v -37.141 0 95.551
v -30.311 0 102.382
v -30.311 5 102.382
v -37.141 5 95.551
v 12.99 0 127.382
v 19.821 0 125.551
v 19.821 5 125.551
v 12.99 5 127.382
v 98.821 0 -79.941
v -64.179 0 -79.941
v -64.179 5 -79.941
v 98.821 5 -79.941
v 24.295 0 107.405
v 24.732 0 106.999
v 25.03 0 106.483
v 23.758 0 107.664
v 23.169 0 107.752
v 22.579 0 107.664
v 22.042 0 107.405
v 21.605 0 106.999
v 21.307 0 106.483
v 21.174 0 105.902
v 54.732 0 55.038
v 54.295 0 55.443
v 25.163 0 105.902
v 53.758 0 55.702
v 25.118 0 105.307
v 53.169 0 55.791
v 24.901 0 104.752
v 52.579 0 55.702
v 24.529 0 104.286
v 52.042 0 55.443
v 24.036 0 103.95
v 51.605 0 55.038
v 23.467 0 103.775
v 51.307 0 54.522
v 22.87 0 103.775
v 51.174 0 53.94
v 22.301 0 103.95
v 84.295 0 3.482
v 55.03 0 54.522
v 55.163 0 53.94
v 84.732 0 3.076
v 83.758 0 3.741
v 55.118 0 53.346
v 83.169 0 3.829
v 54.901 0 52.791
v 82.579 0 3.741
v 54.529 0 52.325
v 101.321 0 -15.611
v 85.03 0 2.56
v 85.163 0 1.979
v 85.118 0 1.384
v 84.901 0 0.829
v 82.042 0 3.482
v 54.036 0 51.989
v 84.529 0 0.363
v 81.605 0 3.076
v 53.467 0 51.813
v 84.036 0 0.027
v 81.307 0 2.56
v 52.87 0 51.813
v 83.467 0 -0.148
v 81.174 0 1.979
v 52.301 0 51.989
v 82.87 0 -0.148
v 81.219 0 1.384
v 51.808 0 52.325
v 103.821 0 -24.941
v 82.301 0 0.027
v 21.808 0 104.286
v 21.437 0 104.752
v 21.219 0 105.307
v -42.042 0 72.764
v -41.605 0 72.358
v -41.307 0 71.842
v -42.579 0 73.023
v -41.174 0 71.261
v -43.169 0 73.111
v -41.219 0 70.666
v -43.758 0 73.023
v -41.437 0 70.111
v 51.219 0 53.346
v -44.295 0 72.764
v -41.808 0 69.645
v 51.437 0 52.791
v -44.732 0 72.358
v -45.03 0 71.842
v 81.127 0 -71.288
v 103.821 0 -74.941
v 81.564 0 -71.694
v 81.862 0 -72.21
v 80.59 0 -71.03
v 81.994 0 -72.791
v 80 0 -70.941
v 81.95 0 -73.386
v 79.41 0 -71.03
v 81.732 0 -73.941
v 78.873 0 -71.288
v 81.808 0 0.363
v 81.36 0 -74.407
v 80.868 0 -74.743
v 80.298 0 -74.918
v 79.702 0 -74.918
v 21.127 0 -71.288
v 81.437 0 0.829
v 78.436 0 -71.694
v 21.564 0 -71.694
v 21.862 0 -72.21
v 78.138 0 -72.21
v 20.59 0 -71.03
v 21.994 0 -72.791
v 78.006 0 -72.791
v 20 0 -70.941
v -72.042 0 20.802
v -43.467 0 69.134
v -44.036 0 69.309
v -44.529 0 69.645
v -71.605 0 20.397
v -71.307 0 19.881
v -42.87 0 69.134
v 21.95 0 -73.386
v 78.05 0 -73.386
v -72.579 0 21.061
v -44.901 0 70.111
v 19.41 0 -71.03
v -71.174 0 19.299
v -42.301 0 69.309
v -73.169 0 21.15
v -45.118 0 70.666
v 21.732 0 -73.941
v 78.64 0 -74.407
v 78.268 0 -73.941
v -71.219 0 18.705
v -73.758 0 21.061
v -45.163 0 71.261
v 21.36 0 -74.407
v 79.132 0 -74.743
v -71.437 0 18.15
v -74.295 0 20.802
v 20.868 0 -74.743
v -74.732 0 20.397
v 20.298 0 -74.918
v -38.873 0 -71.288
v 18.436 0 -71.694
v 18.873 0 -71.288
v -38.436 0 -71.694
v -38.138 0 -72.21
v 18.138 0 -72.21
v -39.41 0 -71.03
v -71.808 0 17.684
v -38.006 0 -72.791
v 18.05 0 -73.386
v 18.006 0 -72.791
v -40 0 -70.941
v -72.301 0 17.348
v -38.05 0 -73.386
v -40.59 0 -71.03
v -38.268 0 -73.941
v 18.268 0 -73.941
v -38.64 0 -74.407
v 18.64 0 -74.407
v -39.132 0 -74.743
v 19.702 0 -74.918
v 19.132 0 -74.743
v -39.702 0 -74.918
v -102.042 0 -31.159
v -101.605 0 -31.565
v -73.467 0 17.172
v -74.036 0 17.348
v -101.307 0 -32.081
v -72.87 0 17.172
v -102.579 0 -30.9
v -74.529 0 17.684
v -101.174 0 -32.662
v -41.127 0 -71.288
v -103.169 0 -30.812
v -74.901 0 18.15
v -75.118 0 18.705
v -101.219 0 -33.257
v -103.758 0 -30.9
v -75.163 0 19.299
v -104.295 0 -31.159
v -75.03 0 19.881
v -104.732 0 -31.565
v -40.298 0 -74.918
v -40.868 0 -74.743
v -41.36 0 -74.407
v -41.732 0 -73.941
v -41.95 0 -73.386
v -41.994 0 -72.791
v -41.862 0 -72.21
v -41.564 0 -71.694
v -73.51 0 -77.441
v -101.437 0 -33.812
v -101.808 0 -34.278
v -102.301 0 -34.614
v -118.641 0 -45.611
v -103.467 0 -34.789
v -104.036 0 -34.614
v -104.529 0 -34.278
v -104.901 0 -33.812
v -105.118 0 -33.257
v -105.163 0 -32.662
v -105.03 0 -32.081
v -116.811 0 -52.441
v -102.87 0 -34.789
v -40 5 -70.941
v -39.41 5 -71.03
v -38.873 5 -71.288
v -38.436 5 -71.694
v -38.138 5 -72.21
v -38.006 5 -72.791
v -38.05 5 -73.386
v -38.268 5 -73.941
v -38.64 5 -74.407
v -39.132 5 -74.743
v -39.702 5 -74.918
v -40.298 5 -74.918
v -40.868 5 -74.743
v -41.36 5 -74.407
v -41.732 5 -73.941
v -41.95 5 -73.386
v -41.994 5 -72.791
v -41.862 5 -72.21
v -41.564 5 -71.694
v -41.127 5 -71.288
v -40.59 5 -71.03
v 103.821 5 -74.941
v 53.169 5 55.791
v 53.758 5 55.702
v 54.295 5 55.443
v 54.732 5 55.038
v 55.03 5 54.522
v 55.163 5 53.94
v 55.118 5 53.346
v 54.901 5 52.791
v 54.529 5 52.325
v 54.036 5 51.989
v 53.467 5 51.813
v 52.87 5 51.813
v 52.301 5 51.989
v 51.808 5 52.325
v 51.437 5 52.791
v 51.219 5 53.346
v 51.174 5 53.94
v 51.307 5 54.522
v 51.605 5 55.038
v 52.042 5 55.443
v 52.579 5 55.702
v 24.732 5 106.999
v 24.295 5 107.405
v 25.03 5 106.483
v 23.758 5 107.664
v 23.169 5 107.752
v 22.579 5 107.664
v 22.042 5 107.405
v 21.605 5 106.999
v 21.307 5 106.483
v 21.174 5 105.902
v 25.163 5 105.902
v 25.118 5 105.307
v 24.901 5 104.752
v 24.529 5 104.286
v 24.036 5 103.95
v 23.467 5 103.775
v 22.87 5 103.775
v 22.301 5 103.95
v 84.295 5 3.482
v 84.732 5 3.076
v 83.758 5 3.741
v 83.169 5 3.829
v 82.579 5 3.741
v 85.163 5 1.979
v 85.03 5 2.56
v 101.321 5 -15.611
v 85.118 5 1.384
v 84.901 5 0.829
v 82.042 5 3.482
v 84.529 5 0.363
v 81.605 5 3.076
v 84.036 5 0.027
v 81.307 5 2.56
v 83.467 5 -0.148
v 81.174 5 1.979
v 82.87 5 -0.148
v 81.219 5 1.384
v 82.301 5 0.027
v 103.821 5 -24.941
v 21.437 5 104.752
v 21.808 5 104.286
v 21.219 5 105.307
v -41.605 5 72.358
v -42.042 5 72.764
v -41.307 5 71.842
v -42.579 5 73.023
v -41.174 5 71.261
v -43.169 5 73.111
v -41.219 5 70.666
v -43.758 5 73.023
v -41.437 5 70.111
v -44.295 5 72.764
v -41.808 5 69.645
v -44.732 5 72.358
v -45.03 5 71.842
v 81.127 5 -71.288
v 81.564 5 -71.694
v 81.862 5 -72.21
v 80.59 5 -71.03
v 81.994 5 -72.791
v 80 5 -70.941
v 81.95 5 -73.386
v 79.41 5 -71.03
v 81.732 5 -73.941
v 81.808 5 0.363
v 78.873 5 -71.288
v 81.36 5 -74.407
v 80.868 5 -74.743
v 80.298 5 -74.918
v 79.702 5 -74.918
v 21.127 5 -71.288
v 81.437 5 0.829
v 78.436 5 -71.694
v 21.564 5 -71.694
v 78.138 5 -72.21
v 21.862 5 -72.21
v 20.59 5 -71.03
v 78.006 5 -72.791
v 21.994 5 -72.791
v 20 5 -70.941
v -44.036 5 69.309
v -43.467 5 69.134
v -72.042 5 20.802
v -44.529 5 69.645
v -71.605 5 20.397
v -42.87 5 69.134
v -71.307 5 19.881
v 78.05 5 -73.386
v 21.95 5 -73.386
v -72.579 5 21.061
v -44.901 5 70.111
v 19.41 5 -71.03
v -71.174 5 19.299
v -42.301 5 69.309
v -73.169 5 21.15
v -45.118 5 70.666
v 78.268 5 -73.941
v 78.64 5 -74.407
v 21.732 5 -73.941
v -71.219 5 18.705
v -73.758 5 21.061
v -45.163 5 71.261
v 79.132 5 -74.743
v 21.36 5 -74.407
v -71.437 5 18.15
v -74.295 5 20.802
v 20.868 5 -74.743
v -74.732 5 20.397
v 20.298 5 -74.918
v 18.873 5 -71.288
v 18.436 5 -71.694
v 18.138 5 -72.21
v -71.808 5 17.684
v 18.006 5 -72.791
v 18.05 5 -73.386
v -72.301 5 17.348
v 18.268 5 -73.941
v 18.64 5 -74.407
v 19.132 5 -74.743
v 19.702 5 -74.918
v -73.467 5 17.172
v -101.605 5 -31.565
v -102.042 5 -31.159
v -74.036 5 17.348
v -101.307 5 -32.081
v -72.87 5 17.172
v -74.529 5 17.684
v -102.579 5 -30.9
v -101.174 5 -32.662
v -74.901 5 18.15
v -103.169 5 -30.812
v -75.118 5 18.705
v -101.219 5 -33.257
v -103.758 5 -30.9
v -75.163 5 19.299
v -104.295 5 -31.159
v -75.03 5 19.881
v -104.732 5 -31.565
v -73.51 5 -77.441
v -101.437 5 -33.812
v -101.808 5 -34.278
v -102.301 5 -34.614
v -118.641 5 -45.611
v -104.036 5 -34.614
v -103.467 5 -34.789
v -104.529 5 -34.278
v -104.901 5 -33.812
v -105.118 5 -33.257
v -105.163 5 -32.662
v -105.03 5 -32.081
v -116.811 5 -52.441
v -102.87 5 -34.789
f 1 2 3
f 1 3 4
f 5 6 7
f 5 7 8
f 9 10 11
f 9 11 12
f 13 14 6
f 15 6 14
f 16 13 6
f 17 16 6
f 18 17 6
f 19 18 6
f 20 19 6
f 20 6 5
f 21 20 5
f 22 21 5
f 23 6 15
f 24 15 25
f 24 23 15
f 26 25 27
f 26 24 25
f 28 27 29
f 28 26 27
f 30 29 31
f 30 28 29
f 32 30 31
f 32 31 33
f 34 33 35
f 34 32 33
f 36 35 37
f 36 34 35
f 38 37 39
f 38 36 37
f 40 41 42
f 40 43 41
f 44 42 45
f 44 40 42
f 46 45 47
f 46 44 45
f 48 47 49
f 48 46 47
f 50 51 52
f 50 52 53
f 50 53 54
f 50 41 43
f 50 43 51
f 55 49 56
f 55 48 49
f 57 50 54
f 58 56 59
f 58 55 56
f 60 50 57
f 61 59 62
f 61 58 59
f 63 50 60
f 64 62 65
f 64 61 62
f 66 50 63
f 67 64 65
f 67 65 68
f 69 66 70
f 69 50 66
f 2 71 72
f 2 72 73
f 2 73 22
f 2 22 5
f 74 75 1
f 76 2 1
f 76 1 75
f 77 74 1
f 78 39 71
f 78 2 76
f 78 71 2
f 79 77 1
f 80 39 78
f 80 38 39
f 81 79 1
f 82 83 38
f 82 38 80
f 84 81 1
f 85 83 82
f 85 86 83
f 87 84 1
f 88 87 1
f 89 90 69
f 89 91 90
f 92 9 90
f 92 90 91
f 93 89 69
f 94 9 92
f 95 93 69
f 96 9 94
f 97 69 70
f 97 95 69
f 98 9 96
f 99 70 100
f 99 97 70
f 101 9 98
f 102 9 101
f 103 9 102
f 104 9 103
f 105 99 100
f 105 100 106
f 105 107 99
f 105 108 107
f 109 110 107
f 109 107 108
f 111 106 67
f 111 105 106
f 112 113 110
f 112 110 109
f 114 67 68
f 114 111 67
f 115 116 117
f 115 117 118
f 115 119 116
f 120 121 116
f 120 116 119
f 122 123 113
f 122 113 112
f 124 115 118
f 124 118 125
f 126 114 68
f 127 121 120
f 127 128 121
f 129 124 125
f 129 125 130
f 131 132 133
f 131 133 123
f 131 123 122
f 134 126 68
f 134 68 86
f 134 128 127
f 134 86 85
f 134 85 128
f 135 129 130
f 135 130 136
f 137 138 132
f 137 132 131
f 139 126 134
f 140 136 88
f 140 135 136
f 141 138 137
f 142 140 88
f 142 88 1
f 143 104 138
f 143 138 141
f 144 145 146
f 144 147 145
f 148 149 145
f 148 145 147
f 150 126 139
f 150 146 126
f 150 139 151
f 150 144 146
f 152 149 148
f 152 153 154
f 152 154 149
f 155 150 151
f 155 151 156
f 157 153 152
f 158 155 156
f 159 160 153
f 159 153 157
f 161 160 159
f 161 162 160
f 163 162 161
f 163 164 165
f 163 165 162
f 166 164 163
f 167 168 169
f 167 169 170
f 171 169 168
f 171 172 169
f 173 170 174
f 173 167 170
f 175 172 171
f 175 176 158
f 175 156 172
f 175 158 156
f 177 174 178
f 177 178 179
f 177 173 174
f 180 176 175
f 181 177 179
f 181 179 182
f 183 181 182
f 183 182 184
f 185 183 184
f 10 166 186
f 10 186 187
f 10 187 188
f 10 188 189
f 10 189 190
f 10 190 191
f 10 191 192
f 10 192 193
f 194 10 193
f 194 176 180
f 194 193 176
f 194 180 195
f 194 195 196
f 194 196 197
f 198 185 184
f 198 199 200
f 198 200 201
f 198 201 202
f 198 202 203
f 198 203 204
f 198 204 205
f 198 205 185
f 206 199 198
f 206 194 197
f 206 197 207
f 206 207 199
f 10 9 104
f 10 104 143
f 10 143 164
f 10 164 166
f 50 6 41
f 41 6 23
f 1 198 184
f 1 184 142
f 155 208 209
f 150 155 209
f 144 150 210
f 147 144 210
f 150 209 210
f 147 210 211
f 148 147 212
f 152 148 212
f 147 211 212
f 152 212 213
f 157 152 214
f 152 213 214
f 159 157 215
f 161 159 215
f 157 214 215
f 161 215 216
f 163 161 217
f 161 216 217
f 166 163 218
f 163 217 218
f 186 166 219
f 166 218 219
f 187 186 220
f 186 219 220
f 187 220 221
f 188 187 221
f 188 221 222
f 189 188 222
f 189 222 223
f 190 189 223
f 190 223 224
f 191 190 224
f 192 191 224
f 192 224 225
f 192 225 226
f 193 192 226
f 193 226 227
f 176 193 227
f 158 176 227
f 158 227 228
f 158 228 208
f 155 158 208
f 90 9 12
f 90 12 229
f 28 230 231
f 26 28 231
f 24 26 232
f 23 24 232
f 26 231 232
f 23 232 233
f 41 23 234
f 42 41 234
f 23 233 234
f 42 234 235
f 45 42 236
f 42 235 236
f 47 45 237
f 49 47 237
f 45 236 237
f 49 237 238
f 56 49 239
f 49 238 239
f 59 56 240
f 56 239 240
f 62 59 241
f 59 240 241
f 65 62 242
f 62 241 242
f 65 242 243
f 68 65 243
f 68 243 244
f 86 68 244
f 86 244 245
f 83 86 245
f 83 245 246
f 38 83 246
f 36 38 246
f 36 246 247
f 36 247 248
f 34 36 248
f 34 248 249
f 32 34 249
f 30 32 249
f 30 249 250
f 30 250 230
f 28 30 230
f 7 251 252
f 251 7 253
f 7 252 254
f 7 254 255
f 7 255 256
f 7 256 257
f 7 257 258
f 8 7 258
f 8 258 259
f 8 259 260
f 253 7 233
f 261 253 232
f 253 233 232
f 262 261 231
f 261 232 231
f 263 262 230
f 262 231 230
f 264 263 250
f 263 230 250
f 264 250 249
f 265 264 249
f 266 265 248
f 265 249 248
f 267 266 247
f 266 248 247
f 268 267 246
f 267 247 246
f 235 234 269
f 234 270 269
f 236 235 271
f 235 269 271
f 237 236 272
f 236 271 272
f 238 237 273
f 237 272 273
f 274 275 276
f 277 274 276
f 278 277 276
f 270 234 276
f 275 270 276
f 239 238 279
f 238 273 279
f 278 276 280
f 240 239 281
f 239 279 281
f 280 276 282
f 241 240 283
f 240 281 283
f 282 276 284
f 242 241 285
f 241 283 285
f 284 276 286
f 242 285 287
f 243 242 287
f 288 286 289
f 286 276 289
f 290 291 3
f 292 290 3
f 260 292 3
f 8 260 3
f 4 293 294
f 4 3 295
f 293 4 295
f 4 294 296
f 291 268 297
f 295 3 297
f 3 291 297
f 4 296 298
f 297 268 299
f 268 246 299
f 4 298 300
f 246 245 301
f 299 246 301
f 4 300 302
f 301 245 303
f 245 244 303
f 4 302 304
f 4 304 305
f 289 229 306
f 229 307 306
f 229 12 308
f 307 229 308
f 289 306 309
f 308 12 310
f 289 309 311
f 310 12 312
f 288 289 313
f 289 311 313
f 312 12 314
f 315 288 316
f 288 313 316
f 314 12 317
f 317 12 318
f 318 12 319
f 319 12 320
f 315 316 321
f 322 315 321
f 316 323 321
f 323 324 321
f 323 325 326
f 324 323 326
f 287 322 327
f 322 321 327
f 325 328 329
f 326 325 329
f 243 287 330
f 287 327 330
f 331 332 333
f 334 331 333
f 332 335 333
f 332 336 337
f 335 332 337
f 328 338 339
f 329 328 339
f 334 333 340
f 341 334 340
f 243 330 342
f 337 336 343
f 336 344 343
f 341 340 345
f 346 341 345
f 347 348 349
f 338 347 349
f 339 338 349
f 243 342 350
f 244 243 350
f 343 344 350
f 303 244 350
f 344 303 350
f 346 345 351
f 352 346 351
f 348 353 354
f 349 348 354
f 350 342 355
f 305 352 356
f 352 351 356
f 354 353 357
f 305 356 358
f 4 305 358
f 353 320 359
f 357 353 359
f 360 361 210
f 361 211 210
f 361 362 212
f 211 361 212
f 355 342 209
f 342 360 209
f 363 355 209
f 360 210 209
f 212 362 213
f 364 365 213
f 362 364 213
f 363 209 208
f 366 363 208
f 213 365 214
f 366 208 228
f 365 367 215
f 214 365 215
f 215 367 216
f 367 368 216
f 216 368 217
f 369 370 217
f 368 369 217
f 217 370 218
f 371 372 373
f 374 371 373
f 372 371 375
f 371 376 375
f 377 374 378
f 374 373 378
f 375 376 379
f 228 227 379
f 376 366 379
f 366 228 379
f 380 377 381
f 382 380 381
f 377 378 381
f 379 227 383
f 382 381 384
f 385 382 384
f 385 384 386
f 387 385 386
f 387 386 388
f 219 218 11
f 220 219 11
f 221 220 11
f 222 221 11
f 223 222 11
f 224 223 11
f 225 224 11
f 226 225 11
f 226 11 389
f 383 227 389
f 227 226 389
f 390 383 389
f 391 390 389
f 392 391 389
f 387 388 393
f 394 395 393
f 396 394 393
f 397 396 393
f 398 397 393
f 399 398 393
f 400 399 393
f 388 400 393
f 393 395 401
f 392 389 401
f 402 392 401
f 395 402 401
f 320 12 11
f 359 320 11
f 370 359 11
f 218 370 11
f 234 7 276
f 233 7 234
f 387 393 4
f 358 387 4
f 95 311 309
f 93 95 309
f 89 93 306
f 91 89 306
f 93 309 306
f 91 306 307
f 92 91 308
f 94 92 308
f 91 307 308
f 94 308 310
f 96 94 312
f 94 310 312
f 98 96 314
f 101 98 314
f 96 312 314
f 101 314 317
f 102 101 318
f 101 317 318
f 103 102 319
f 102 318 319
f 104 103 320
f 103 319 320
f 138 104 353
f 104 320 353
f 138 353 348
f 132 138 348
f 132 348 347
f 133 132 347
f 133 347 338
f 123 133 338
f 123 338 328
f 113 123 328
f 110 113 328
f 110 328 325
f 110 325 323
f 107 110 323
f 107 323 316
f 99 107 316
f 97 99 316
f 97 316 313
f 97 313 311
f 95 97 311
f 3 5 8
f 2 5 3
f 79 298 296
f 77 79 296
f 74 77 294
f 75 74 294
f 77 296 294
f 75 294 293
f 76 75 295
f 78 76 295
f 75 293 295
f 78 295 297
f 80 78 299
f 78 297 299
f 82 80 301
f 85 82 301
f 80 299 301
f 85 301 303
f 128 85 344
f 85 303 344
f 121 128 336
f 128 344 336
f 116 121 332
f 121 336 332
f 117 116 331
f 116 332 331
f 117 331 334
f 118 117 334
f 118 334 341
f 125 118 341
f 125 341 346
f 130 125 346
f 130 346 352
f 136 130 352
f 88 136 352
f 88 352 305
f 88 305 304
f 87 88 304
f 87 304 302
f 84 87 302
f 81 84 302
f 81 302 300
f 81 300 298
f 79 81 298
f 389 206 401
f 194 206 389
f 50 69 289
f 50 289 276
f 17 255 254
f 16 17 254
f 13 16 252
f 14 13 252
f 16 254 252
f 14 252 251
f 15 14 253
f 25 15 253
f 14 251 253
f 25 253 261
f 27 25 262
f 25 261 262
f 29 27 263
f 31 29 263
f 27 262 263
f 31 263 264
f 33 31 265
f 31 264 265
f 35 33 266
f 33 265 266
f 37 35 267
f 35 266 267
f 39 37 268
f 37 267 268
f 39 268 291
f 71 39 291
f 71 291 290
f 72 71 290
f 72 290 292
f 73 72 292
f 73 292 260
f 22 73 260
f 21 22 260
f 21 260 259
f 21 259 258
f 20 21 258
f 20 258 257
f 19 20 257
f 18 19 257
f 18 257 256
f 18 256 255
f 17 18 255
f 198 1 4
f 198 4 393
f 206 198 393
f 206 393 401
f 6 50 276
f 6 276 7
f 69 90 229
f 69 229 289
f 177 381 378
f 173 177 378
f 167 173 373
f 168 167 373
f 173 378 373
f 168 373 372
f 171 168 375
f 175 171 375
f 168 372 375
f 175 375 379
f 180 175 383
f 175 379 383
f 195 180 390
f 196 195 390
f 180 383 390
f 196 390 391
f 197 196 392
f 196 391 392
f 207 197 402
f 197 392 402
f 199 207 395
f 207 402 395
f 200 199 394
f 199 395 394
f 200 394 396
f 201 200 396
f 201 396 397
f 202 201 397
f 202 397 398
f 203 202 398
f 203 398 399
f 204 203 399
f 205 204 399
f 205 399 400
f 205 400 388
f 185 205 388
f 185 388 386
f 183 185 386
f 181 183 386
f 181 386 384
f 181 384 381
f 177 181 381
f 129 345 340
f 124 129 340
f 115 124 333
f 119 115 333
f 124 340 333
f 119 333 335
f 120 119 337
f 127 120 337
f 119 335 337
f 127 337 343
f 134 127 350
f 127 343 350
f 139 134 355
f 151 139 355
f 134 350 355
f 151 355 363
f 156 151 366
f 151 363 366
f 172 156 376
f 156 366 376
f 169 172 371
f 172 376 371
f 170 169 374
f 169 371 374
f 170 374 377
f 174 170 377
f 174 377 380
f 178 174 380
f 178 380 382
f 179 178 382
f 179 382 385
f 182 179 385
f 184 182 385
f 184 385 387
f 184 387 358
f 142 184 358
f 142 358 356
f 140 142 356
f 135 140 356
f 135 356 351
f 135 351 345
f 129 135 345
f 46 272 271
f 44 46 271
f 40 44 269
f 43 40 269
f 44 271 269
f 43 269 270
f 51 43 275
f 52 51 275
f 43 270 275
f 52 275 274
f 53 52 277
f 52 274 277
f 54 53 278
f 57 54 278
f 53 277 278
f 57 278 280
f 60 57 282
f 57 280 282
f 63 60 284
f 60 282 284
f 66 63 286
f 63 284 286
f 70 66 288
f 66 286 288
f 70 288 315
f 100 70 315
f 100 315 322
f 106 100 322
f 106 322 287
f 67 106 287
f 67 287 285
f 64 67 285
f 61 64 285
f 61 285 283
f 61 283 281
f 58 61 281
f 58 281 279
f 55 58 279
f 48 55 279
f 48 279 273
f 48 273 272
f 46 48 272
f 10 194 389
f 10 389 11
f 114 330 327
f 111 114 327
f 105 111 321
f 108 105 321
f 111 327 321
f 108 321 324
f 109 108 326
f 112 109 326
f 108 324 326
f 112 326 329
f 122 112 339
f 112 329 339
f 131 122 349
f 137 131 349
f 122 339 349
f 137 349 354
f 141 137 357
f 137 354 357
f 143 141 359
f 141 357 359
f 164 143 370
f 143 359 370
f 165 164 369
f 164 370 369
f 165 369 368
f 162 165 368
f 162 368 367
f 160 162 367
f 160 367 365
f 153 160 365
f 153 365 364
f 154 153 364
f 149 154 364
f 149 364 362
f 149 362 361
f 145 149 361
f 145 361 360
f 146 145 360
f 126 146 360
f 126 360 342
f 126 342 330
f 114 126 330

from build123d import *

# Parameters (mm, degrees)
EXTRUSION1_DEPTH         = 5
ENL_V_MAT_EXTRU_14_REACH = 176.146
ESQUISSE8_R              = 2


with BuildPart() as part:
    # Esquisse1 → Extrusion1 (new body)
    with BuildSketch(Plane(origin=(0, 0, 0), x_dir=(1, 0, 0), z_dir=(0, 1, 0))):
        Polygon((-64.179491924, 79.940798285), (98.820508076, 79.940798285), (103.820508076, 74.940798285), (103.820508076, 24.940798285), (101.320508076, 15.610671266), (19.820508076, -125.551469551), (12.990381057, -127.38159657), (-30.310889132, -102.38159657), (-37.141016151, -95.551469551), (-118.641016151, 45.610671266), (-116.810889132, 52.440798285), (-73.509618943, 77.440798285), align=None)
    extrude(amount=EXTRUSION1_DEPTH)

    # Esquisse8 → Enlèv. mat.-Extru.14 (cut, up to next)
    with BuildSketch(Plane(origin=(0, 5, 0), x_dir=(1, 0, 0), z_dir=(0, 1, 0)), mode=Mode.PRIVATE) as enl_v_mat_extru_14_sk1:
        with Locations(Location((-103.168584287, 32.81163316, 0), (0, 0, 270))):
            Circle(ESQUISSE8_R)
    enl_v_mat_extru_14_tool1 = extrude(enl_v_mat_extru_14_sk1.sketch, amount=-ENL_V_MAT_EXTRU_14_REACH, mode=Mode.PRIVATE) & part.part
    # Esquisse8 → Enlèv. mat.-Extru.14 (cut, up to next)
    with BuildSketch(Plane(origin=(0, 5, 0), x_dir=(1, 0, 0), z_dir=(0, 1, 0)), mode=Mode.PRIVATE) as enl_v_mat_extru_14_sk2:
        with Locations(Location((80, 72.940798285, 0), (0, 0, 270))):
            Circle(ESQUISSE8_R)
    enl_v_mat_extru_14_tool2 = extrude(enl_v_mat_extru_14_sk2.sketch, amount=-ENL_V_MAT_EXTRU_14_REACH, mode=Mode.PRIVATE) & part.part
    # Esquisse8 → Enlèv. mat.-Extru.14 (cut, up to next)
    with BuildSketch(Plane(origin=(0, 5, 0), x_dir=(1, 0, 0), z_dir=(0, 1, 0)), mode=Mode.PRIVATE) as enl_v_mat_extru_14_sk3:
        with Locations(Location((20, 72.940798285, 0), (0, 0, 270))):
            Circle(ESQUISSE8_R)
    enl_v_mat_extru_14_tool3 = extrude(enl_v_mat_extru_14_sk3.sketch, amount=-ENL_V_MAT_EXTRU_14_REACH, mode=Mode.PRIVATE) & part.part
    # Esquisse8 → Enlèv. mat.-Extru.14 (cut, up to next)
    with BuildSketch(Plane(origin=(0, 5, 0), x_dir=(1, 0, 0), z_dir=(0, 1, 0)), mode=Mode.PRIVATE) as enl_v_mat_extru_14_sk4:
        with Locations(Location((-73.168584287, -19.149891067, 0), (0, 0, 270))):
            Circle(ESQUISSE8_R)
    enl_v_mat_extru_14_tool4 = extrude(enl_v_mat_extru_14_sk4.sketch, amount=-ENL_V_MAT_EXTRU_14_REACH, mode=Mode.PRIVATE) & part.part
    # Esquisse8 → Enlèv. mat.-Extru.14 (cut, up to next)
    with BuildSketch(Plane(origin=(0, 5, 0), x_dir=(1, 0, 0), z_dir=(0, 1, 0)), mode=Mode.PRIVATE) as enl_v_mat_extru_14_sk5:
        with Locations(Location((-43.168584287, -71.111415294, 0), (0, 0, 270))):
            Circle(ESQUISSE8_R)
    enl_v_mat_extru_14_tool5 = extrude(enl_v_mat_extru_14_sk5.sketch, amount=-ENL_V_MAT_EXTRU_14_REACH, mode=Mode.PRIVATE) & part.part
    # Esquisse8 → Enlèv. mat.-Extru.14 (cut, up to next)
    with BuildSketch(Plane(origin=(0, 5, 0), x_dir=(1, 0, 0), z_dir=(0, 1, 0)), mode=Mode.PRIVATE) as enl_v_mat_extru_14_sk6:
        with Locations(Location((-40, 72.940798285, 0), (0, 0, 270))):
            Circle(ESQUISSE8_R)
    enl_v_mat_extru_14_tool6 = extrude(enl_v_mat_extru_14_sk6.sketch, amount=-ENL_V_MAT_EXTRU_14_REACH, mode=Mode.PRIVATE) & part.part
    # Esquisse8 → Enlèv. mat.-Extru.14 (cut, up to next)
    with BuildSketch(Plane(origin=(0, 5, 0), x_dir=(1, 0, 0), z_dir=(0, 1, 0)), mode=Mode.PRIVATE) as enl_v_mat_extru_14_sk7:
        with Locations(Location((23.168584287, -105.752431445, 0), (0, 0, 270))):
            Circle(ESQUISSE8_R)
    enl_v_mat_extru_14_tool7 = extrude(enl_v_mat_extru_14_sk7.sketch, amount=-ENL_V_MAT_EXTRU_14_REACH, mode=Mode.PRIVATE) & part.part
    # Esquisse8 → Enlèv. mat.-Extru.14 (cut, up to next)
    with BuildSketch(Plane(origin=(0, 5, 0), x_dir=(1, 0, 0), z_dir=(0, 1, 0)), mode=Mode.PRIVATE) as enl_v_mat_extru_14_sk8:
        with Locations(Location((53.168584287, -53.790907218, 0), (0, 0, 270))):
            Circle(ESQUISSE8_R)
    enl_v_mat_extru_14_tool8 = extrude(enl_v_mat_extru_14_sk8.sketch, amount=-ENL_V_MAT_EXTRU_14_REACH, mode=Mode.PRIVATE) & part.part
    # Esquisse8 → Enlèv. mat.-Extru.14 (cut, up to next)
    with BuildSketch(Plane(origin=(0, 5, 0), x_dir=(1, 0, 0), z_dir=(0, 1, 0)), mode=Mode.PRIVATE) as enl_v_mat_extru_14_sk9:
        with Locations(Location((83.168584287, -1.829382991, 0), (0, 0, 270))):
            Circle(ESQUISSE8_R)
    enl_v_mat_extru_14_tool9 = extrude(enl_v_mat_extru_14_sk9.sketch, amount=-ENL_V_MAT_EXTRU_14_REACH, mode=Mode.PRIVATE) & part.part
    add(enl_v_mat_extru_14_tool1.solids().sort_by_distance((-103.168584, 5, -32.811633))[0], mode=Mode.SUBTRACT)
    add(enl_v_mat_extru_14_tool2.solids().sort_by_distance((80, 5, -72.940798))[0], mode=Mode.SUBTRACT)
    add(enl_v_mat_extru_14_tool3.solids().sort_by_distance((20, 5, -72.940798))[0], mode=Mode.SUBTRACT)
    add(enl_v_mat_extru_14_tool4.solids().sort_by_distance((-73.168584, 5, 19.149891))[0], mode=Mode.SUBTRACT)
    add(enl_v_mat_extru_14_tool5.solids().sort_by_distance((-43.168584, 5, 71.111415))[0], mode=Mode.SUBTRACT)
    add(enl_v_mat_extru_14_tool6.solids().sort_by_distance((-40, 5, -72.940798))[0], mode=Mode.SUBTRACT)
    add(enl_v_mat_extru_14_tool7.solids().sort_by_distance((23.168584, 5, 105.752431))[0], mode=Mode.SUBTRACT)
    add(enl_v_mat_extru_14_tool8.solids().sort_by_distance((53.168584, 5, 53.790907))[0], mode=Mode.SUBTRACT)
    add(enl_v_mat_extru_14_tool9.solids().sort_by_distance((83.168584, 5, 1.829383))[0], mode=Mode.SUBTRACT)


solid = part.part
